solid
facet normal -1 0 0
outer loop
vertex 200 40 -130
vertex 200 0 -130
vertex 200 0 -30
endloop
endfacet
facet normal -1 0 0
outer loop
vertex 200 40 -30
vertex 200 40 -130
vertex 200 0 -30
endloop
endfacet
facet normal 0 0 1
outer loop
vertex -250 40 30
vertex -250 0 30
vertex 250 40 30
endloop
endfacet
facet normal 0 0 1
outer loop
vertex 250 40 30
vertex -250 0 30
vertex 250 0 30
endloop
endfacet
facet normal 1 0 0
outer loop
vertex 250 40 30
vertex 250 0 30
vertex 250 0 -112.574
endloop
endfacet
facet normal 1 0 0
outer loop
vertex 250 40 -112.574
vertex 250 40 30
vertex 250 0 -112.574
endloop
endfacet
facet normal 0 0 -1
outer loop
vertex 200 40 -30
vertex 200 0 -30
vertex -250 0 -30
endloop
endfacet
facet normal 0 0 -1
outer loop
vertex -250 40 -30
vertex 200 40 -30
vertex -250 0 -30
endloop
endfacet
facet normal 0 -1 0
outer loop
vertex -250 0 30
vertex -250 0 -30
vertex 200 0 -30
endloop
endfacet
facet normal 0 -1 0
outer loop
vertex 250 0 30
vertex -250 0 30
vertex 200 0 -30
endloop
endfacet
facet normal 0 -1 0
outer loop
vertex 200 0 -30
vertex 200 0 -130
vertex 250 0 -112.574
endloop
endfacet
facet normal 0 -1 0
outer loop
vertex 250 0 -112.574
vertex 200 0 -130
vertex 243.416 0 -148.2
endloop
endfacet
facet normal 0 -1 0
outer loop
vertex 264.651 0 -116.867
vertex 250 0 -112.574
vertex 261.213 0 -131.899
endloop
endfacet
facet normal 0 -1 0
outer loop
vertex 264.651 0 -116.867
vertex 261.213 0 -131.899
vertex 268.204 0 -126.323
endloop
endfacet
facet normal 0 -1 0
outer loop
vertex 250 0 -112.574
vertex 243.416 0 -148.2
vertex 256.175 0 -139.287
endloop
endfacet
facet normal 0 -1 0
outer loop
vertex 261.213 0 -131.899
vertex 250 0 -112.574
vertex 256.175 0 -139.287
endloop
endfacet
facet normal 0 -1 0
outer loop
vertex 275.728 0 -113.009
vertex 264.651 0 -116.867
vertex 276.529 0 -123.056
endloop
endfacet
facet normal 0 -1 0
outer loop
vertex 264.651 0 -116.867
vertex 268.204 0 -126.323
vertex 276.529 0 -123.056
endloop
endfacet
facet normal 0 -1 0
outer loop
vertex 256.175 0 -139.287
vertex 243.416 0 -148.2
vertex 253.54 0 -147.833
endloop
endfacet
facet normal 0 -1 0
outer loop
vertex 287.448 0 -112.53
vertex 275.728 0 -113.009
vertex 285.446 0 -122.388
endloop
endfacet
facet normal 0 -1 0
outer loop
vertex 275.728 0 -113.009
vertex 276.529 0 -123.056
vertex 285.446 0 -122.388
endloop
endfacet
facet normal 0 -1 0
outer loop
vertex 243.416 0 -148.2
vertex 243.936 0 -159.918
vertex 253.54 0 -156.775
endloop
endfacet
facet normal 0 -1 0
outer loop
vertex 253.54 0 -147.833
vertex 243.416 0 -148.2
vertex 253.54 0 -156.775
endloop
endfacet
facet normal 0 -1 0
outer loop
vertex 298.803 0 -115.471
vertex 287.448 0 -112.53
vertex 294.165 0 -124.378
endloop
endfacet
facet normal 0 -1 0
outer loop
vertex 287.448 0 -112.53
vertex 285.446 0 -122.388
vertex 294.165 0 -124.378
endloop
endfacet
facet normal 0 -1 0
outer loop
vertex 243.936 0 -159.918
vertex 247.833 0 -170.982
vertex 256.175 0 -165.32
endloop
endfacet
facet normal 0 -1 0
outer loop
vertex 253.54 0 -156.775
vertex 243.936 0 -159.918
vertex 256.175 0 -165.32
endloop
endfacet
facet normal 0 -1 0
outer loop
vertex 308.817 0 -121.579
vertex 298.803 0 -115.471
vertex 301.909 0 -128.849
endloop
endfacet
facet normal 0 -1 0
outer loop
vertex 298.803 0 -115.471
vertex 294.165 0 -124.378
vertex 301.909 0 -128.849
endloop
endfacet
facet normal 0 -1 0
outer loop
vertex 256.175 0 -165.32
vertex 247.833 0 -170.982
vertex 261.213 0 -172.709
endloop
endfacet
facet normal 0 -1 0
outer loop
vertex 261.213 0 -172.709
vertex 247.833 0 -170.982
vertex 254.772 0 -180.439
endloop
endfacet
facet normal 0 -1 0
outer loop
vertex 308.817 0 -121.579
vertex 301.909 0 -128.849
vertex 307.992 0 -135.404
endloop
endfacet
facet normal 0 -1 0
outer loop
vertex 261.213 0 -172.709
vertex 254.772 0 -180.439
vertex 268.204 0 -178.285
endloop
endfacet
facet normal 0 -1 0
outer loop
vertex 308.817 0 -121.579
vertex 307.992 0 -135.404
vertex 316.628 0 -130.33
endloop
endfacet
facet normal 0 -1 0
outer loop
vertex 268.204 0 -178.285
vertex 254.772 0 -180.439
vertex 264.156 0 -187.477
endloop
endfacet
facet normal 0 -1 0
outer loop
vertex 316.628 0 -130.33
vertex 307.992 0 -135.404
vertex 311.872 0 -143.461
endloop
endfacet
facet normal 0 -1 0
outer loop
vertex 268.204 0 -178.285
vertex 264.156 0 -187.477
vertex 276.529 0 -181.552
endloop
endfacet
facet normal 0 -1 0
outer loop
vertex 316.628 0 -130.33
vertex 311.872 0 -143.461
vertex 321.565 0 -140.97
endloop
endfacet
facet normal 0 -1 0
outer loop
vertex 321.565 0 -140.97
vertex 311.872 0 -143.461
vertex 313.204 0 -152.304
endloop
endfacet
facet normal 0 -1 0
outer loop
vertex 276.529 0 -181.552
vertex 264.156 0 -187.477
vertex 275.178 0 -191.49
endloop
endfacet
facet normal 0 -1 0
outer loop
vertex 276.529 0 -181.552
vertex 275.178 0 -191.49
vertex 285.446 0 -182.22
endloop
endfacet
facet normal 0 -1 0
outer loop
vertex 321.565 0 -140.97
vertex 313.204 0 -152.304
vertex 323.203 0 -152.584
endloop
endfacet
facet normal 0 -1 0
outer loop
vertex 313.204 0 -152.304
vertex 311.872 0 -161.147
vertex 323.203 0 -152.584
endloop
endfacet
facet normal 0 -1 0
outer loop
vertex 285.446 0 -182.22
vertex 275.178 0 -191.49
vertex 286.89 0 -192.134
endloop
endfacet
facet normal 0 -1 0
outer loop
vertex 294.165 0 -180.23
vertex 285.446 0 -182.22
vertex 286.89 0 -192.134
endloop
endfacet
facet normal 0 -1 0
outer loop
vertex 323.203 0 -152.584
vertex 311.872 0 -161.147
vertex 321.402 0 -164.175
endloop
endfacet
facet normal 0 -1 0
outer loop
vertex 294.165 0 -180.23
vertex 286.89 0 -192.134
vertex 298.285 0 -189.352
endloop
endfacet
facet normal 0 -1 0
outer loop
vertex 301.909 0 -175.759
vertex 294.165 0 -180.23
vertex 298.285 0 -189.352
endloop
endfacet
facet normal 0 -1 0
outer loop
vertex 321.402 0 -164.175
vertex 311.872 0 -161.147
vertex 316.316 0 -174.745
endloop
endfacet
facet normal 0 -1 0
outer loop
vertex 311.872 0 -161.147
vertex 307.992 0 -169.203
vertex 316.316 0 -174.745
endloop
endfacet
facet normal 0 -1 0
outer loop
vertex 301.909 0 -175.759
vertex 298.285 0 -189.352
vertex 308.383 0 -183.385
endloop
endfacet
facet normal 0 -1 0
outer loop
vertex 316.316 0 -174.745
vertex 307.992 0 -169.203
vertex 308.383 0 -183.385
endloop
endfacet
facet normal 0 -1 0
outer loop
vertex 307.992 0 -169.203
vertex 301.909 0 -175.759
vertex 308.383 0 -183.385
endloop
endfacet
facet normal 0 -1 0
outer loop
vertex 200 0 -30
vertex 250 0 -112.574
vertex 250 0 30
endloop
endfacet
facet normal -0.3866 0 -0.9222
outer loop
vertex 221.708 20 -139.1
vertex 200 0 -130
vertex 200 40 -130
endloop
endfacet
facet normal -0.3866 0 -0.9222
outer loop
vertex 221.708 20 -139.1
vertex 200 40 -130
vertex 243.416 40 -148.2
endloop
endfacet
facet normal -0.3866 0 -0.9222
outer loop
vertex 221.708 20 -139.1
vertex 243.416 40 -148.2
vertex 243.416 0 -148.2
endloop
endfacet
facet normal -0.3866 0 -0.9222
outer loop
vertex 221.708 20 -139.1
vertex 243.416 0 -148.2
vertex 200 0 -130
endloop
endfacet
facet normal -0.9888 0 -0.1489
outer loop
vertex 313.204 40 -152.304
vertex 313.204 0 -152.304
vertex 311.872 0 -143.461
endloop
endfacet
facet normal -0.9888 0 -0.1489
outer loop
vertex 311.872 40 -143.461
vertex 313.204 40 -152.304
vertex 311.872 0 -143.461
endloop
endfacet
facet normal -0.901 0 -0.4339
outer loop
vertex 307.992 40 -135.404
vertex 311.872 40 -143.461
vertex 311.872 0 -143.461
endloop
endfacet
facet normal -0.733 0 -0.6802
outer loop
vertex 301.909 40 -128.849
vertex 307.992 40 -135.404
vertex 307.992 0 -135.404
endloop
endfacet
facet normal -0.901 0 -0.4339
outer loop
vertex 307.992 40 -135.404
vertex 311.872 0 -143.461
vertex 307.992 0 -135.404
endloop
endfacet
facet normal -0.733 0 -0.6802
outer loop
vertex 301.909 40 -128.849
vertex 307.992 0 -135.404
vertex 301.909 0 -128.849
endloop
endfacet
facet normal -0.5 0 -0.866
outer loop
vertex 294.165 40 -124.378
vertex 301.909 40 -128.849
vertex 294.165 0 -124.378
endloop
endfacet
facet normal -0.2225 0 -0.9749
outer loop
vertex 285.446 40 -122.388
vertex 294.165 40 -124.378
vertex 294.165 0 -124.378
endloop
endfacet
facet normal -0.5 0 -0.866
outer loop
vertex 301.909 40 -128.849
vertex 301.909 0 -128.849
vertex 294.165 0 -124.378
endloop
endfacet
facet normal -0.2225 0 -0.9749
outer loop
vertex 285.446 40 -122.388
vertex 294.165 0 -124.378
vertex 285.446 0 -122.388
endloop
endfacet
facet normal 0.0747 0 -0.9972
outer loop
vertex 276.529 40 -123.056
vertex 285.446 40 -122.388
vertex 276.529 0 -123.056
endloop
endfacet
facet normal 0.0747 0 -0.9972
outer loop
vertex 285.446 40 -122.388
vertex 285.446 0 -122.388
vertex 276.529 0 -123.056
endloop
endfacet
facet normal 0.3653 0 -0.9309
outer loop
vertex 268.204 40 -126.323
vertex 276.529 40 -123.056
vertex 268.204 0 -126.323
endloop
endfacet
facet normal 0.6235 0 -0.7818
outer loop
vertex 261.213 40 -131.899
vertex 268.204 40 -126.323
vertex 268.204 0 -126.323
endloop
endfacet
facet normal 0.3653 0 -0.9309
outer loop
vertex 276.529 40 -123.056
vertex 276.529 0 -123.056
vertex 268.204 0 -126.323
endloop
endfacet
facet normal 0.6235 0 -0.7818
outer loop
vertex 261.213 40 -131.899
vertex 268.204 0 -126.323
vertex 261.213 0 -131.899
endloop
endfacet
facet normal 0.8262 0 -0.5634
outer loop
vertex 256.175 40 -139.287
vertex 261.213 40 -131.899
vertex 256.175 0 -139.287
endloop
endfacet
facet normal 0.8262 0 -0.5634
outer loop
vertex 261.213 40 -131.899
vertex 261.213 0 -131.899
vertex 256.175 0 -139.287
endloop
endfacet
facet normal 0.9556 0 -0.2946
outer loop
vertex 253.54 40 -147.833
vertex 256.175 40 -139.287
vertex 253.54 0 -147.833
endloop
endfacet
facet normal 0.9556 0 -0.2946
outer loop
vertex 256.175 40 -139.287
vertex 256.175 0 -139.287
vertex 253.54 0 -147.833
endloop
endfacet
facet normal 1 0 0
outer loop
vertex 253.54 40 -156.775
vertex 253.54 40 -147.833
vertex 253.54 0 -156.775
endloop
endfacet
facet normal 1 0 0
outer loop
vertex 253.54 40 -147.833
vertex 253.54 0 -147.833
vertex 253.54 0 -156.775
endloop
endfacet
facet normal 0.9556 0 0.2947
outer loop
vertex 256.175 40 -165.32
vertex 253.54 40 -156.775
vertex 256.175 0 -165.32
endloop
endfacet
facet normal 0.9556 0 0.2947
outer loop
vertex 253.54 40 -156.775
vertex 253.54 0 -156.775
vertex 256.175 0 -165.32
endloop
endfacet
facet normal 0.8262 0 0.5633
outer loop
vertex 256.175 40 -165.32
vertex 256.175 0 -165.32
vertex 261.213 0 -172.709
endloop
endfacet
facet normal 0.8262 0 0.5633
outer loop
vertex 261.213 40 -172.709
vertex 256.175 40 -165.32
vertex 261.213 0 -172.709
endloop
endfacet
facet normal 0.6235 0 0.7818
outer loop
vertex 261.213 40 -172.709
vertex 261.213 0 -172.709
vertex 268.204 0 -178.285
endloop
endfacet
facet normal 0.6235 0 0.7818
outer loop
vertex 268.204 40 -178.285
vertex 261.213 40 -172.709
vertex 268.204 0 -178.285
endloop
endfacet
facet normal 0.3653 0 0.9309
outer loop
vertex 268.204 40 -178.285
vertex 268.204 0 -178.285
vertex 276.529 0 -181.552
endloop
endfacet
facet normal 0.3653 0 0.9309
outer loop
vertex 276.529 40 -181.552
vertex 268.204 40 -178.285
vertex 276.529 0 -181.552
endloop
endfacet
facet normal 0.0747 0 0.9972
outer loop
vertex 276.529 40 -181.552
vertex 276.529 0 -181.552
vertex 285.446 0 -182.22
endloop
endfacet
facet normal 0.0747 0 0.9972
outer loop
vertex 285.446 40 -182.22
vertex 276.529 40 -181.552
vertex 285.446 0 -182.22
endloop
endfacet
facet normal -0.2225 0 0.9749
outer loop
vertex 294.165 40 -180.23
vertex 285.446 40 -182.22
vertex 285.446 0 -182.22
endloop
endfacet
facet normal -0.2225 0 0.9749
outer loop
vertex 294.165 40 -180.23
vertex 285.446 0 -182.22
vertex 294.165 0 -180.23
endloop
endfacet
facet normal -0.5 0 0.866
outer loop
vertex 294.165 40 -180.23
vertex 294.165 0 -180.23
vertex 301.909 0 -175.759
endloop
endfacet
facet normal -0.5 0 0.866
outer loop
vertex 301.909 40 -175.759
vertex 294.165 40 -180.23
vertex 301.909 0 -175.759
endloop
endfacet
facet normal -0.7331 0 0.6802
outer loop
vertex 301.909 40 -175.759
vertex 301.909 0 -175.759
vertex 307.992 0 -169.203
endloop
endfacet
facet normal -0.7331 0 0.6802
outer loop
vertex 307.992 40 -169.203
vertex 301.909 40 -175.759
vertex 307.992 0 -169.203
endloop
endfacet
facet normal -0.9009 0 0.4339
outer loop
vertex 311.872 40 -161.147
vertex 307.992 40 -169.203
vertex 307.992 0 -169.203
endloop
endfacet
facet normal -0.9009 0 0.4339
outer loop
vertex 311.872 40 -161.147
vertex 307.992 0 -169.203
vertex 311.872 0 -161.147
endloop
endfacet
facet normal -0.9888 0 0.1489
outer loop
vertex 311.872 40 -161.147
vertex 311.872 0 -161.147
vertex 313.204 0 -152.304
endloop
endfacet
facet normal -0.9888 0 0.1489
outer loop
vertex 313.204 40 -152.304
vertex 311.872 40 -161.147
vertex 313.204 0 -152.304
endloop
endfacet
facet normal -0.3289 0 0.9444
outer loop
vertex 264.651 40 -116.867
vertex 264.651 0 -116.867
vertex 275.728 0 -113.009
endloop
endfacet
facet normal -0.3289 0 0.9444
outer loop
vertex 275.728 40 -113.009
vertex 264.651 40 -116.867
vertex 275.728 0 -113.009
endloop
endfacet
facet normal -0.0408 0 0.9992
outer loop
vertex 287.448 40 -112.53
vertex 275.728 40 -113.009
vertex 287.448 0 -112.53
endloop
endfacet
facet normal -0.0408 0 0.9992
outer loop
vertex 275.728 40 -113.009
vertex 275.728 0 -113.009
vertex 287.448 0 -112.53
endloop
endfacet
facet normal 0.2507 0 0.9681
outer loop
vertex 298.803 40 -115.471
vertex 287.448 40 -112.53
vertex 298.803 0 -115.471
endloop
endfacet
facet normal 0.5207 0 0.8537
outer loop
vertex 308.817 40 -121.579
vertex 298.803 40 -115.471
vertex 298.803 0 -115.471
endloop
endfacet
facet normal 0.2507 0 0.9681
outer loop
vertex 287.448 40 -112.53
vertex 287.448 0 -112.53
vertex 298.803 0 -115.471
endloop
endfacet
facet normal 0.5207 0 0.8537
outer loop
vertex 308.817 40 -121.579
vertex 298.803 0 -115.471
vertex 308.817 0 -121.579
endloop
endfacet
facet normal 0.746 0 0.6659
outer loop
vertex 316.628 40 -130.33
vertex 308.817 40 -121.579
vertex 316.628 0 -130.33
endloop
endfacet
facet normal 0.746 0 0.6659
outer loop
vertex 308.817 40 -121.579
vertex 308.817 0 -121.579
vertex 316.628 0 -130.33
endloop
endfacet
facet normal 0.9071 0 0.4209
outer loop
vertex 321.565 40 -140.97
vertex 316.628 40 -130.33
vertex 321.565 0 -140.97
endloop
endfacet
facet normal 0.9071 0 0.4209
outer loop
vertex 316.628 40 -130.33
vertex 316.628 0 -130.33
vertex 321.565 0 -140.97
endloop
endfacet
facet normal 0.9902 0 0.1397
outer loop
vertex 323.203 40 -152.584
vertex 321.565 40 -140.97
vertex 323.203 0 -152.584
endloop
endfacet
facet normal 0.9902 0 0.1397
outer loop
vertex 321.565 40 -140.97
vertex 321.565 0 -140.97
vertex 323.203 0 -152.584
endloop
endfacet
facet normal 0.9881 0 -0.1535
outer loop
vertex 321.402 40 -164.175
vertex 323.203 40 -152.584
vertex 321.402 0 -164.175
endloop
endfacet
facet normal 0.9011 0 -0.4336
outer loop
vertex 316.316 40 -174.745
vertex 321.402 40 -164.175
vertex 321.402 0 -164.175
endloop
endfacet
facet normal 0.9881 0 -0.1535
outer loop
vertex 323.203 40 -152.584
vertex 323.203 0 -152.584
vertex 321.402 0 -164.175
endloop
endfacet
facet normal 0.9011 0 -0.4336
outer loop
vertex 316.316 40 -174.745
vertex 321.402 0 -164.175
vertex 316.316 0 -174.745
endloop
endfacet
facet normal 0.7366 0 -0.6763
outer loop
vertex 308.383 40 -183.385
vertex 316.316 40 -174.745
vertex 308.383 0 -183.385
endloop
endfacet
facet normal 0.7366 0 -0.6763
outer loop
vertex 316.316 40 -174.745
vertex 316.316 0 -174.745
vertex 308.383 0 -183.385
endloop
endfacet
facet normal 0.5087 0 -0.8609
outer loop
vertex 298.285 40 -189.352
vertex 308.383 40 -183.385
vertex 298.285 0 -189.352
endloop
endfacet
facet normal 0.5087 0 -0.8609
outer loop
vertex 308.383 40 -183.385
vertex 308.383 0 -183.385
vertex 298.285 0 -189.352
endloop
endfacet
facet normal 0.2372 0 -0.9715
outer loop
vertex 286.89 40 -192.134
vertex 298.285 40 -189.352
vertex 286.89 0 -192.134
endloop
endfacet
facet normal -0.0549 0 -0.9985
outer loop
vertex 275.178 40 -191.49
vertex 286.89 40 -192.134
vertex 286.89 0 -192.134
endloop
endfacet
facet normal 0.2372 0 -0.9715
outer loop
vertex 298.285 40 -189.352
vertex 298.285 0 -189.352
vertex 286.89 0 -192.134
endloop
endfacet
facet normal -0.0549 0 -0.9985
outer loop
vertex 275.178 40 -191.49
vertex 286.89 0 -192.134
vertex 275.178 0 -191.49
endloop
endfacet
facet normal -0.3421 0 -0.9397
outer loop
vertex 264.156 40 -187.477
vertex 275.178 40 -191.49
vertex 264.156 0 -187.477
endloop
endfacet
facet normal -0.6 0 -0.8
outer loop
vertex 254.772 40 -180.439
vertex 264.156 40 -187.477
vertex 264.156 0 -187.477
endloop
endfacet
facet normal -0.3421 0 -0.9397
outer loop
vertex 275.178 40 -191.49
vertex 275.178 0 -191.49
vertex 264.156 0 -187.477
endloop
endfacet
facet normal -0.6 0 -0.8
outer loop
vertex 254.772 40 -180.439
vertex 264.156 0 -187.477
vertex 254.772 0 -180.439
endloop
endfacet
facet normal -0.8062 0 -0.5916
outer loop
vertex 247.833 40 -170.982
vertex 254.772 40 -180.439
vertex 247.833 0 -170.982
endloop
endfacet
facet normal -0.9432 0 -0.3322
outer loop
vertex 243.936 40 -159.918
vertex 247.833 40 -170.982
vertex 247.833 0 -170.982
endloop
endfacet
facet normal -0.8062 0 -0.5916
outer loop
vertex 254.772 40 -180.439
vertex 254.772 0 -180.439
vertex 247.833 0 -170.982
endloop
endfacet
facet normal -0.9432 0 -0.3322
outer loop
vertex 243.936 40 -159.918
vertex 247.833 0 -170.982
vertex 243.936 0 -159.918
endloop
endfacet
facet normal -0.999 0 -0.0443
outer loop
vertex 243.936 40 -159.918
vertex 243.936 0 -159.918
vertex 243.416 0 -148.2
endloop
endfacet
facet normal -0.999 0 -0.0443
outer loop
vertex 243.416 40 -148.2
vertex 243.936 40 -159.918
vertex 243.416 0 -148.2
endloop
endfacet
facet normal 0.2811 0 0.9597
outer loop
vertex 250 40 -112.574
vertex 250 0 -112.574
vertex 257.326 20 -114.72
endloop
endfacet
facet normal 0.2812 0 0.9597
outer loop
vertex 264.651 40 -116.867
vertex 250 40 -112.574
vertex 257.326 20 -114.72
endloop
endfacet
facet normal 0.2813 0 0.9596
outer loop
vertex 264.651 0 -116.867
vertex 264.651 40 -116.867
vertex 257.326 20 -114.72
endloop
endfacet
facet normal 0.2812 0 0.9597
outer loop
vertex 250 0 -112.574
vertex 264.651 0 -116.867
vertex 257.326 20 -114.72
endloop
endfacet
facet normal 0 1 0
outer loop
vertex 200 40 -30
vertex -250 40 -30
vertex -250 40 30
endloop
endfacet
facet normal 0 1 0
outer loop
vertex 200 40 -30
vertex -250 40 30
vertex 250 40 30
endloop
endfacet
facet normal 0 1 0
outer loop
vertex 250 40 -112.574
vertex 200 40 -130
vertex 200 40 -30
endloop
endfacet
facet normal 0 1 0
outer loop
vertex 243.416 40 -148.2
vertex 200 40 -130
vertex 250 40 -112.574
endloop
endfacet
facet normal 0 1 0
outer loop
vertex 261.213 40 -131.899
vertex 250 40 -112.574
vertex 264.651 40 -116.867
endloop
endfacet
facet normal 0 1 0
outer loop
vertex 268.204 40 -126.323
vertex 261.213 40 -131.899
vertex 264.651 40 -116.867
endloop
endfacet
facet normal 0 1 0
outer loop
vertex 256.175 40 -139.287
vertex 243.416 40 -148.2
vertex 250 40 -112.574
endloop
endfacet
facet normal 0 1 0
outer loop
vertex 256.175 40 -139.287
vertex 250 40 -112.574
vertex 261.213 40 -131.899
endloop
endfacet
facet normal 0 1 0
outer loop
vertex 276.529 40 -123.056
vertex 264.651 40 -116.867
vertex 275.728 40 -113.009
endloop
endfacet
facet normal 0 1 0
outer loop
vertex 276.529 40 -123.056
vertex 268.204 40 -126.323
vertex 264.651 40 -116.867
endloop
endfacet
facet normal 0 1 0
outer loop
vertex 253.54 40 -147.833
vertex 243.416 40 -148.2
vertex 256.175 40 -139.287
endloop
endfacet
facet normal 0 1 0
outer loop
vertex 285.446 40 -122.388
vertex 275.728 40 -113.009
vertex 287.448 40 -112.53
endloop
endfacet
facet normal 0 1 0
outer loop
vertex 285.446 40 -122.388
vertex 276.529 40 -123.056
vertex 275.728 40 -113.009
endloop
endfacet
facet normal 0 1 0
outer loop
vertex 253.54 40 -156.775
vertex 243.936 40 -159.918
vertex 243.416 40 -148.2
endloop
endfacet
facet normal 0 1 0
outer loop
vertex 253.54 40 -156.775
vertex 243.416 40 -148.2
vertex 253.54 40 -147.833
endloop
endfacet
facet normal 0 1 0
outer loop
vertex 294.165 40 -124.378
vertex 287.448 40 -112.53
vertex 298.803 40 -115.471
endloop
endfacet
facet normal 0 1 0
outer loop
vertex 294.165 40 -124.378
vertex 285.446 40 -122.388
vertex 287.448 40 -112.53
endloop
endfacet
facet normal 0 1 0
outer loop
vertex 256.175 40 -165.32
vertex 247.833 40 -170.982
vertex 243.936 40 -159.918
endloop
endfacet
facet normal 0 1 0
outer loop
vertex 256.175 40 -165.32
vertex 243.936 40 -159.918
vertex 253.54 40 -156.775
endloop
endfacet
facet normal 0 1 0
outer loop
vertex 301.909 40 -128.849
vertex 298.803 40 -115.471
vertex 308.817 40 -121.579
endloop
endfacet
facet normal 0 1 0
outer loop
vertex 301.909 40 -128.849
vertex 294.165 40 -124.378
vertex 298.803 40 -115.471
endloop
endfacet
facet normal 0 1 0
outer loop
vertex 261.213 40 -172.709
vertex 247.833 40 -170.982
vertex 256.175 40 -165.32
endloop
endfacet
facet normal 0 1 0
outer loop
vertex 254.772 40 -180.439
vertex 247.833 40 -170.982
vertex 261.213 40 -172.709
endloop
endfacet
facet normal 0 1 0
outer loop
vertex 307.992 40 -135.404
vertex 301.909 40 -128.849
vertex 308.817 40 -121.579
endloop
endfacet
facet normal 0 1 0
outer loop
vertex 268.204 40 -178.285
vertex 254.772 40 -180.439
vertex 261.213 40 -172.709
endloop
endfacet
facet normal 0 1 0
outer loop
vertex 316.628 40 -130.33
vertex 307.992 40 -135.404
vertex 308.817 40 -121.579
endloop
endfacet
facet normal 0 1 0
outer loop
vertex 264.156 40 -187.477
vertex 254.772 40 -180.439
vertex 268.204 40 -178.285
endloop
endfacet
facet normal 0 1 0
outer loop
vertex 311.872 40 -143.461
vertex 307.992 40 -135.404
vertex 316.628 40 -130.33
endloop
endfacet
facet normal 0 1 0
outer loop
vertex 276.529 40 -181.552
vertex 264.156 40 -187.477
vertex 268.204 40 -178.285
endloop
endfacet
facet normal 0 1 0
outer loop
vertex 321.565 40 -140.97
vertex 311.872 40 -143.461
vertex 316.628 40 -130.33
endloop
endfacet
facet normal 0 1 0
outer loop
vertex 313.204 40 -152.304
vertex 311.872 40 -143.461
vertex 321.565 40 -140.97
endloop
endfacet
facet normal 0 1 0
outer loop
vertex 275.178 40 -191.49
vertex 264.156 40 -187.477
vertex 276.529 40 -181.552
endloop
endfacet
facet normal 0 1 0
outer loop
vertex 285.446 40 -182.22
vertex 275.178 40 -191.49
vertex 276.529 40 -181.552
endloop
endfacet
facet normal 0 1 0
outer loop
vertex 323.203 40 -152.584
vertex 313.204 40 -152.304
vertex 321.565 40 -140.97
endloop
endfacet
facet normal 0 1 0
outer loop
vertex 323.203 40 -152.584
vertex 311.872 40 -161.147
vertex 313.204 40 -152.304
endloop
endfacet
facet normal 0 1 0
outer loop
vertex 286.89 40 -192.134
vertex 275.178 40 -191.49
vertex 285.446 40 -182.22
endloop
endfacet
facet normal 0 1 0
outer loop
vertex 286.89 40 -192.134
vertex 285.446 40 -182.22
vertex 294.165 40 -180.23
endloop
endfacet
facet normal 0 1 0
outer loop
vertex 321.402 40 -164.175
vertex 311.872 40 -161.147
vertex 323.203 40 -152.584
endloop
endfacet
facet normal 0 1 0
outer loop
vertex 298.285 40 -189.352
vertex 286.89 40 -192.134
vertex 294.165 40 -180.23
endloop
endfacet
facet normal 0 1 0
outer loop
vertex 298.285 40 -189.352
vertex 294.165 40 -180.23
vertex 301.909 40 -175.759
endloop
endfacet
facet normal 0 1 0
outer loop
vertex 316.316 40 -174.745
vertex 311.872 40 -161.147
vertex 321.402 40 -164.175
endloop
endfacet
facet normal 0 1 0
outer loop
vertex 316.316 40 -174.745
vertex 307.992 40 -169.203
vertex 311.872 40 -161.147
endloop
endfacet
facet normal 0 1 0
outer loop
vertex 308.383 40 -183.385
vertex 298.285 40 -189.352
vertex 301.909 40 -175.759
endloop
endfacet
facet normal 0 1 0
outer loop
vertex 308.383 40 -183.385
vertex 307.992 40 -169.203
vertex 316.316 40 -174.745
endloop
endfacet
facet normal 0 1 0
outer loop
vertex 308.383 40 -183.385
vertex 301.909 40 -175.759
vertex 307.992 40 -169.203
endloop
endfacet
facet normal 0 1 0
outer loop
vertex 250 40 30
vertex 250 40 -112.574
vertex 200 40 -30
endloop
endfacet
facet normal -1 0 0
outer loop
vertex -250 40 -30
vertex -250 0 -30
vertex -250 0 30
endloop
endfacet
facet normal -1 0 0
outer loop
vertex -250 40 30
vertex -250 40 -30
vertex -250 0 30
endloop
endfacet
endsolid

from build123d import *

# Parameters (mm, degrees)
BOSS_EXTRUDE4_DEPTH            = 40
CUT_EXTRUDE1_REACH             = 42
SKETCH6_R                      = 30
CUT_EXTRUDE1_DIRECTION_2_DEPTH = 1.0000001


with BuildPart() as part:
    # Sketch2 → Boss-Extrude4 (new body)
    with BuildSketch(Plane(origin=(0, 0, 0), x_dir=(1, 0, 0), z_dir=(0, 1, 0))):
        with BuildLine():
            Line((200, 30), (-250, 30))
            Line((-250, 30), (-250, -30))
            Line((-250, -30), (250, -30))
            Line((250, -30), (250, 30))
            Line((250, 30), (250, 112.573687244))
            add(Edge.make_bspline(
                [(250, 112.573687244), (257.32553359, 114.720346637), (264.651067179, 116.867006031)],
                knots=[0, 0, 0, 0.441237609, 0.441237609, 0.441237609], degree=2))
            ThreePointArc((264.651067179, 116.867006031), (316.316425408, 174.744880654), (243.415537745, 148.200235436))
            add(Edge.make_bspline(
                [(200, 130), (221.707768873, 139.100117718), (243.415537745, 148.200235436)],
                knots=[0, 0, 0, 0.816012756, 0.816012756, 0.816012756], degree=2))
            Line((200, 130), (200, 30))
        make_face()
    extrude(amount=BOSS_EXTRUDE4_DEPTH)

    # Sketch6 → Cut-Extrude1 (cut, up to next)
    with BuildSketch(Plane.XZ, mode=Mode.PRIVATE) as cut_extrude1_sk1:
        with Locations((283.204484122, -152.303861418)):
            Circle(SKETCH6_R)
    cut_extrude1_tool1 = extrude(cut_extrude1_sk1.sketch, amount=-CUT_EXTRUDE1_REACH, mode=Mode.PRIVATE) & part.part
    add(cut_extrude1_tool1.solids().sort_by_distance((283.204484, 0, -152.303861))[0], mode=Mode.SUBTRACT)

    # Sketch6 → Cut-Extrude1 direction 2 (cut)
    with BuildSketch(Plane.XZ):
        with Locations((283.204484122, -152.303861418)):
            Circle(SKETCH6_R)
    extrude(amount=CUT_EXTRUDE1_DIRECTION_2_DEPTH, mode=Mode.SUBTRACT)


solid = part.part
